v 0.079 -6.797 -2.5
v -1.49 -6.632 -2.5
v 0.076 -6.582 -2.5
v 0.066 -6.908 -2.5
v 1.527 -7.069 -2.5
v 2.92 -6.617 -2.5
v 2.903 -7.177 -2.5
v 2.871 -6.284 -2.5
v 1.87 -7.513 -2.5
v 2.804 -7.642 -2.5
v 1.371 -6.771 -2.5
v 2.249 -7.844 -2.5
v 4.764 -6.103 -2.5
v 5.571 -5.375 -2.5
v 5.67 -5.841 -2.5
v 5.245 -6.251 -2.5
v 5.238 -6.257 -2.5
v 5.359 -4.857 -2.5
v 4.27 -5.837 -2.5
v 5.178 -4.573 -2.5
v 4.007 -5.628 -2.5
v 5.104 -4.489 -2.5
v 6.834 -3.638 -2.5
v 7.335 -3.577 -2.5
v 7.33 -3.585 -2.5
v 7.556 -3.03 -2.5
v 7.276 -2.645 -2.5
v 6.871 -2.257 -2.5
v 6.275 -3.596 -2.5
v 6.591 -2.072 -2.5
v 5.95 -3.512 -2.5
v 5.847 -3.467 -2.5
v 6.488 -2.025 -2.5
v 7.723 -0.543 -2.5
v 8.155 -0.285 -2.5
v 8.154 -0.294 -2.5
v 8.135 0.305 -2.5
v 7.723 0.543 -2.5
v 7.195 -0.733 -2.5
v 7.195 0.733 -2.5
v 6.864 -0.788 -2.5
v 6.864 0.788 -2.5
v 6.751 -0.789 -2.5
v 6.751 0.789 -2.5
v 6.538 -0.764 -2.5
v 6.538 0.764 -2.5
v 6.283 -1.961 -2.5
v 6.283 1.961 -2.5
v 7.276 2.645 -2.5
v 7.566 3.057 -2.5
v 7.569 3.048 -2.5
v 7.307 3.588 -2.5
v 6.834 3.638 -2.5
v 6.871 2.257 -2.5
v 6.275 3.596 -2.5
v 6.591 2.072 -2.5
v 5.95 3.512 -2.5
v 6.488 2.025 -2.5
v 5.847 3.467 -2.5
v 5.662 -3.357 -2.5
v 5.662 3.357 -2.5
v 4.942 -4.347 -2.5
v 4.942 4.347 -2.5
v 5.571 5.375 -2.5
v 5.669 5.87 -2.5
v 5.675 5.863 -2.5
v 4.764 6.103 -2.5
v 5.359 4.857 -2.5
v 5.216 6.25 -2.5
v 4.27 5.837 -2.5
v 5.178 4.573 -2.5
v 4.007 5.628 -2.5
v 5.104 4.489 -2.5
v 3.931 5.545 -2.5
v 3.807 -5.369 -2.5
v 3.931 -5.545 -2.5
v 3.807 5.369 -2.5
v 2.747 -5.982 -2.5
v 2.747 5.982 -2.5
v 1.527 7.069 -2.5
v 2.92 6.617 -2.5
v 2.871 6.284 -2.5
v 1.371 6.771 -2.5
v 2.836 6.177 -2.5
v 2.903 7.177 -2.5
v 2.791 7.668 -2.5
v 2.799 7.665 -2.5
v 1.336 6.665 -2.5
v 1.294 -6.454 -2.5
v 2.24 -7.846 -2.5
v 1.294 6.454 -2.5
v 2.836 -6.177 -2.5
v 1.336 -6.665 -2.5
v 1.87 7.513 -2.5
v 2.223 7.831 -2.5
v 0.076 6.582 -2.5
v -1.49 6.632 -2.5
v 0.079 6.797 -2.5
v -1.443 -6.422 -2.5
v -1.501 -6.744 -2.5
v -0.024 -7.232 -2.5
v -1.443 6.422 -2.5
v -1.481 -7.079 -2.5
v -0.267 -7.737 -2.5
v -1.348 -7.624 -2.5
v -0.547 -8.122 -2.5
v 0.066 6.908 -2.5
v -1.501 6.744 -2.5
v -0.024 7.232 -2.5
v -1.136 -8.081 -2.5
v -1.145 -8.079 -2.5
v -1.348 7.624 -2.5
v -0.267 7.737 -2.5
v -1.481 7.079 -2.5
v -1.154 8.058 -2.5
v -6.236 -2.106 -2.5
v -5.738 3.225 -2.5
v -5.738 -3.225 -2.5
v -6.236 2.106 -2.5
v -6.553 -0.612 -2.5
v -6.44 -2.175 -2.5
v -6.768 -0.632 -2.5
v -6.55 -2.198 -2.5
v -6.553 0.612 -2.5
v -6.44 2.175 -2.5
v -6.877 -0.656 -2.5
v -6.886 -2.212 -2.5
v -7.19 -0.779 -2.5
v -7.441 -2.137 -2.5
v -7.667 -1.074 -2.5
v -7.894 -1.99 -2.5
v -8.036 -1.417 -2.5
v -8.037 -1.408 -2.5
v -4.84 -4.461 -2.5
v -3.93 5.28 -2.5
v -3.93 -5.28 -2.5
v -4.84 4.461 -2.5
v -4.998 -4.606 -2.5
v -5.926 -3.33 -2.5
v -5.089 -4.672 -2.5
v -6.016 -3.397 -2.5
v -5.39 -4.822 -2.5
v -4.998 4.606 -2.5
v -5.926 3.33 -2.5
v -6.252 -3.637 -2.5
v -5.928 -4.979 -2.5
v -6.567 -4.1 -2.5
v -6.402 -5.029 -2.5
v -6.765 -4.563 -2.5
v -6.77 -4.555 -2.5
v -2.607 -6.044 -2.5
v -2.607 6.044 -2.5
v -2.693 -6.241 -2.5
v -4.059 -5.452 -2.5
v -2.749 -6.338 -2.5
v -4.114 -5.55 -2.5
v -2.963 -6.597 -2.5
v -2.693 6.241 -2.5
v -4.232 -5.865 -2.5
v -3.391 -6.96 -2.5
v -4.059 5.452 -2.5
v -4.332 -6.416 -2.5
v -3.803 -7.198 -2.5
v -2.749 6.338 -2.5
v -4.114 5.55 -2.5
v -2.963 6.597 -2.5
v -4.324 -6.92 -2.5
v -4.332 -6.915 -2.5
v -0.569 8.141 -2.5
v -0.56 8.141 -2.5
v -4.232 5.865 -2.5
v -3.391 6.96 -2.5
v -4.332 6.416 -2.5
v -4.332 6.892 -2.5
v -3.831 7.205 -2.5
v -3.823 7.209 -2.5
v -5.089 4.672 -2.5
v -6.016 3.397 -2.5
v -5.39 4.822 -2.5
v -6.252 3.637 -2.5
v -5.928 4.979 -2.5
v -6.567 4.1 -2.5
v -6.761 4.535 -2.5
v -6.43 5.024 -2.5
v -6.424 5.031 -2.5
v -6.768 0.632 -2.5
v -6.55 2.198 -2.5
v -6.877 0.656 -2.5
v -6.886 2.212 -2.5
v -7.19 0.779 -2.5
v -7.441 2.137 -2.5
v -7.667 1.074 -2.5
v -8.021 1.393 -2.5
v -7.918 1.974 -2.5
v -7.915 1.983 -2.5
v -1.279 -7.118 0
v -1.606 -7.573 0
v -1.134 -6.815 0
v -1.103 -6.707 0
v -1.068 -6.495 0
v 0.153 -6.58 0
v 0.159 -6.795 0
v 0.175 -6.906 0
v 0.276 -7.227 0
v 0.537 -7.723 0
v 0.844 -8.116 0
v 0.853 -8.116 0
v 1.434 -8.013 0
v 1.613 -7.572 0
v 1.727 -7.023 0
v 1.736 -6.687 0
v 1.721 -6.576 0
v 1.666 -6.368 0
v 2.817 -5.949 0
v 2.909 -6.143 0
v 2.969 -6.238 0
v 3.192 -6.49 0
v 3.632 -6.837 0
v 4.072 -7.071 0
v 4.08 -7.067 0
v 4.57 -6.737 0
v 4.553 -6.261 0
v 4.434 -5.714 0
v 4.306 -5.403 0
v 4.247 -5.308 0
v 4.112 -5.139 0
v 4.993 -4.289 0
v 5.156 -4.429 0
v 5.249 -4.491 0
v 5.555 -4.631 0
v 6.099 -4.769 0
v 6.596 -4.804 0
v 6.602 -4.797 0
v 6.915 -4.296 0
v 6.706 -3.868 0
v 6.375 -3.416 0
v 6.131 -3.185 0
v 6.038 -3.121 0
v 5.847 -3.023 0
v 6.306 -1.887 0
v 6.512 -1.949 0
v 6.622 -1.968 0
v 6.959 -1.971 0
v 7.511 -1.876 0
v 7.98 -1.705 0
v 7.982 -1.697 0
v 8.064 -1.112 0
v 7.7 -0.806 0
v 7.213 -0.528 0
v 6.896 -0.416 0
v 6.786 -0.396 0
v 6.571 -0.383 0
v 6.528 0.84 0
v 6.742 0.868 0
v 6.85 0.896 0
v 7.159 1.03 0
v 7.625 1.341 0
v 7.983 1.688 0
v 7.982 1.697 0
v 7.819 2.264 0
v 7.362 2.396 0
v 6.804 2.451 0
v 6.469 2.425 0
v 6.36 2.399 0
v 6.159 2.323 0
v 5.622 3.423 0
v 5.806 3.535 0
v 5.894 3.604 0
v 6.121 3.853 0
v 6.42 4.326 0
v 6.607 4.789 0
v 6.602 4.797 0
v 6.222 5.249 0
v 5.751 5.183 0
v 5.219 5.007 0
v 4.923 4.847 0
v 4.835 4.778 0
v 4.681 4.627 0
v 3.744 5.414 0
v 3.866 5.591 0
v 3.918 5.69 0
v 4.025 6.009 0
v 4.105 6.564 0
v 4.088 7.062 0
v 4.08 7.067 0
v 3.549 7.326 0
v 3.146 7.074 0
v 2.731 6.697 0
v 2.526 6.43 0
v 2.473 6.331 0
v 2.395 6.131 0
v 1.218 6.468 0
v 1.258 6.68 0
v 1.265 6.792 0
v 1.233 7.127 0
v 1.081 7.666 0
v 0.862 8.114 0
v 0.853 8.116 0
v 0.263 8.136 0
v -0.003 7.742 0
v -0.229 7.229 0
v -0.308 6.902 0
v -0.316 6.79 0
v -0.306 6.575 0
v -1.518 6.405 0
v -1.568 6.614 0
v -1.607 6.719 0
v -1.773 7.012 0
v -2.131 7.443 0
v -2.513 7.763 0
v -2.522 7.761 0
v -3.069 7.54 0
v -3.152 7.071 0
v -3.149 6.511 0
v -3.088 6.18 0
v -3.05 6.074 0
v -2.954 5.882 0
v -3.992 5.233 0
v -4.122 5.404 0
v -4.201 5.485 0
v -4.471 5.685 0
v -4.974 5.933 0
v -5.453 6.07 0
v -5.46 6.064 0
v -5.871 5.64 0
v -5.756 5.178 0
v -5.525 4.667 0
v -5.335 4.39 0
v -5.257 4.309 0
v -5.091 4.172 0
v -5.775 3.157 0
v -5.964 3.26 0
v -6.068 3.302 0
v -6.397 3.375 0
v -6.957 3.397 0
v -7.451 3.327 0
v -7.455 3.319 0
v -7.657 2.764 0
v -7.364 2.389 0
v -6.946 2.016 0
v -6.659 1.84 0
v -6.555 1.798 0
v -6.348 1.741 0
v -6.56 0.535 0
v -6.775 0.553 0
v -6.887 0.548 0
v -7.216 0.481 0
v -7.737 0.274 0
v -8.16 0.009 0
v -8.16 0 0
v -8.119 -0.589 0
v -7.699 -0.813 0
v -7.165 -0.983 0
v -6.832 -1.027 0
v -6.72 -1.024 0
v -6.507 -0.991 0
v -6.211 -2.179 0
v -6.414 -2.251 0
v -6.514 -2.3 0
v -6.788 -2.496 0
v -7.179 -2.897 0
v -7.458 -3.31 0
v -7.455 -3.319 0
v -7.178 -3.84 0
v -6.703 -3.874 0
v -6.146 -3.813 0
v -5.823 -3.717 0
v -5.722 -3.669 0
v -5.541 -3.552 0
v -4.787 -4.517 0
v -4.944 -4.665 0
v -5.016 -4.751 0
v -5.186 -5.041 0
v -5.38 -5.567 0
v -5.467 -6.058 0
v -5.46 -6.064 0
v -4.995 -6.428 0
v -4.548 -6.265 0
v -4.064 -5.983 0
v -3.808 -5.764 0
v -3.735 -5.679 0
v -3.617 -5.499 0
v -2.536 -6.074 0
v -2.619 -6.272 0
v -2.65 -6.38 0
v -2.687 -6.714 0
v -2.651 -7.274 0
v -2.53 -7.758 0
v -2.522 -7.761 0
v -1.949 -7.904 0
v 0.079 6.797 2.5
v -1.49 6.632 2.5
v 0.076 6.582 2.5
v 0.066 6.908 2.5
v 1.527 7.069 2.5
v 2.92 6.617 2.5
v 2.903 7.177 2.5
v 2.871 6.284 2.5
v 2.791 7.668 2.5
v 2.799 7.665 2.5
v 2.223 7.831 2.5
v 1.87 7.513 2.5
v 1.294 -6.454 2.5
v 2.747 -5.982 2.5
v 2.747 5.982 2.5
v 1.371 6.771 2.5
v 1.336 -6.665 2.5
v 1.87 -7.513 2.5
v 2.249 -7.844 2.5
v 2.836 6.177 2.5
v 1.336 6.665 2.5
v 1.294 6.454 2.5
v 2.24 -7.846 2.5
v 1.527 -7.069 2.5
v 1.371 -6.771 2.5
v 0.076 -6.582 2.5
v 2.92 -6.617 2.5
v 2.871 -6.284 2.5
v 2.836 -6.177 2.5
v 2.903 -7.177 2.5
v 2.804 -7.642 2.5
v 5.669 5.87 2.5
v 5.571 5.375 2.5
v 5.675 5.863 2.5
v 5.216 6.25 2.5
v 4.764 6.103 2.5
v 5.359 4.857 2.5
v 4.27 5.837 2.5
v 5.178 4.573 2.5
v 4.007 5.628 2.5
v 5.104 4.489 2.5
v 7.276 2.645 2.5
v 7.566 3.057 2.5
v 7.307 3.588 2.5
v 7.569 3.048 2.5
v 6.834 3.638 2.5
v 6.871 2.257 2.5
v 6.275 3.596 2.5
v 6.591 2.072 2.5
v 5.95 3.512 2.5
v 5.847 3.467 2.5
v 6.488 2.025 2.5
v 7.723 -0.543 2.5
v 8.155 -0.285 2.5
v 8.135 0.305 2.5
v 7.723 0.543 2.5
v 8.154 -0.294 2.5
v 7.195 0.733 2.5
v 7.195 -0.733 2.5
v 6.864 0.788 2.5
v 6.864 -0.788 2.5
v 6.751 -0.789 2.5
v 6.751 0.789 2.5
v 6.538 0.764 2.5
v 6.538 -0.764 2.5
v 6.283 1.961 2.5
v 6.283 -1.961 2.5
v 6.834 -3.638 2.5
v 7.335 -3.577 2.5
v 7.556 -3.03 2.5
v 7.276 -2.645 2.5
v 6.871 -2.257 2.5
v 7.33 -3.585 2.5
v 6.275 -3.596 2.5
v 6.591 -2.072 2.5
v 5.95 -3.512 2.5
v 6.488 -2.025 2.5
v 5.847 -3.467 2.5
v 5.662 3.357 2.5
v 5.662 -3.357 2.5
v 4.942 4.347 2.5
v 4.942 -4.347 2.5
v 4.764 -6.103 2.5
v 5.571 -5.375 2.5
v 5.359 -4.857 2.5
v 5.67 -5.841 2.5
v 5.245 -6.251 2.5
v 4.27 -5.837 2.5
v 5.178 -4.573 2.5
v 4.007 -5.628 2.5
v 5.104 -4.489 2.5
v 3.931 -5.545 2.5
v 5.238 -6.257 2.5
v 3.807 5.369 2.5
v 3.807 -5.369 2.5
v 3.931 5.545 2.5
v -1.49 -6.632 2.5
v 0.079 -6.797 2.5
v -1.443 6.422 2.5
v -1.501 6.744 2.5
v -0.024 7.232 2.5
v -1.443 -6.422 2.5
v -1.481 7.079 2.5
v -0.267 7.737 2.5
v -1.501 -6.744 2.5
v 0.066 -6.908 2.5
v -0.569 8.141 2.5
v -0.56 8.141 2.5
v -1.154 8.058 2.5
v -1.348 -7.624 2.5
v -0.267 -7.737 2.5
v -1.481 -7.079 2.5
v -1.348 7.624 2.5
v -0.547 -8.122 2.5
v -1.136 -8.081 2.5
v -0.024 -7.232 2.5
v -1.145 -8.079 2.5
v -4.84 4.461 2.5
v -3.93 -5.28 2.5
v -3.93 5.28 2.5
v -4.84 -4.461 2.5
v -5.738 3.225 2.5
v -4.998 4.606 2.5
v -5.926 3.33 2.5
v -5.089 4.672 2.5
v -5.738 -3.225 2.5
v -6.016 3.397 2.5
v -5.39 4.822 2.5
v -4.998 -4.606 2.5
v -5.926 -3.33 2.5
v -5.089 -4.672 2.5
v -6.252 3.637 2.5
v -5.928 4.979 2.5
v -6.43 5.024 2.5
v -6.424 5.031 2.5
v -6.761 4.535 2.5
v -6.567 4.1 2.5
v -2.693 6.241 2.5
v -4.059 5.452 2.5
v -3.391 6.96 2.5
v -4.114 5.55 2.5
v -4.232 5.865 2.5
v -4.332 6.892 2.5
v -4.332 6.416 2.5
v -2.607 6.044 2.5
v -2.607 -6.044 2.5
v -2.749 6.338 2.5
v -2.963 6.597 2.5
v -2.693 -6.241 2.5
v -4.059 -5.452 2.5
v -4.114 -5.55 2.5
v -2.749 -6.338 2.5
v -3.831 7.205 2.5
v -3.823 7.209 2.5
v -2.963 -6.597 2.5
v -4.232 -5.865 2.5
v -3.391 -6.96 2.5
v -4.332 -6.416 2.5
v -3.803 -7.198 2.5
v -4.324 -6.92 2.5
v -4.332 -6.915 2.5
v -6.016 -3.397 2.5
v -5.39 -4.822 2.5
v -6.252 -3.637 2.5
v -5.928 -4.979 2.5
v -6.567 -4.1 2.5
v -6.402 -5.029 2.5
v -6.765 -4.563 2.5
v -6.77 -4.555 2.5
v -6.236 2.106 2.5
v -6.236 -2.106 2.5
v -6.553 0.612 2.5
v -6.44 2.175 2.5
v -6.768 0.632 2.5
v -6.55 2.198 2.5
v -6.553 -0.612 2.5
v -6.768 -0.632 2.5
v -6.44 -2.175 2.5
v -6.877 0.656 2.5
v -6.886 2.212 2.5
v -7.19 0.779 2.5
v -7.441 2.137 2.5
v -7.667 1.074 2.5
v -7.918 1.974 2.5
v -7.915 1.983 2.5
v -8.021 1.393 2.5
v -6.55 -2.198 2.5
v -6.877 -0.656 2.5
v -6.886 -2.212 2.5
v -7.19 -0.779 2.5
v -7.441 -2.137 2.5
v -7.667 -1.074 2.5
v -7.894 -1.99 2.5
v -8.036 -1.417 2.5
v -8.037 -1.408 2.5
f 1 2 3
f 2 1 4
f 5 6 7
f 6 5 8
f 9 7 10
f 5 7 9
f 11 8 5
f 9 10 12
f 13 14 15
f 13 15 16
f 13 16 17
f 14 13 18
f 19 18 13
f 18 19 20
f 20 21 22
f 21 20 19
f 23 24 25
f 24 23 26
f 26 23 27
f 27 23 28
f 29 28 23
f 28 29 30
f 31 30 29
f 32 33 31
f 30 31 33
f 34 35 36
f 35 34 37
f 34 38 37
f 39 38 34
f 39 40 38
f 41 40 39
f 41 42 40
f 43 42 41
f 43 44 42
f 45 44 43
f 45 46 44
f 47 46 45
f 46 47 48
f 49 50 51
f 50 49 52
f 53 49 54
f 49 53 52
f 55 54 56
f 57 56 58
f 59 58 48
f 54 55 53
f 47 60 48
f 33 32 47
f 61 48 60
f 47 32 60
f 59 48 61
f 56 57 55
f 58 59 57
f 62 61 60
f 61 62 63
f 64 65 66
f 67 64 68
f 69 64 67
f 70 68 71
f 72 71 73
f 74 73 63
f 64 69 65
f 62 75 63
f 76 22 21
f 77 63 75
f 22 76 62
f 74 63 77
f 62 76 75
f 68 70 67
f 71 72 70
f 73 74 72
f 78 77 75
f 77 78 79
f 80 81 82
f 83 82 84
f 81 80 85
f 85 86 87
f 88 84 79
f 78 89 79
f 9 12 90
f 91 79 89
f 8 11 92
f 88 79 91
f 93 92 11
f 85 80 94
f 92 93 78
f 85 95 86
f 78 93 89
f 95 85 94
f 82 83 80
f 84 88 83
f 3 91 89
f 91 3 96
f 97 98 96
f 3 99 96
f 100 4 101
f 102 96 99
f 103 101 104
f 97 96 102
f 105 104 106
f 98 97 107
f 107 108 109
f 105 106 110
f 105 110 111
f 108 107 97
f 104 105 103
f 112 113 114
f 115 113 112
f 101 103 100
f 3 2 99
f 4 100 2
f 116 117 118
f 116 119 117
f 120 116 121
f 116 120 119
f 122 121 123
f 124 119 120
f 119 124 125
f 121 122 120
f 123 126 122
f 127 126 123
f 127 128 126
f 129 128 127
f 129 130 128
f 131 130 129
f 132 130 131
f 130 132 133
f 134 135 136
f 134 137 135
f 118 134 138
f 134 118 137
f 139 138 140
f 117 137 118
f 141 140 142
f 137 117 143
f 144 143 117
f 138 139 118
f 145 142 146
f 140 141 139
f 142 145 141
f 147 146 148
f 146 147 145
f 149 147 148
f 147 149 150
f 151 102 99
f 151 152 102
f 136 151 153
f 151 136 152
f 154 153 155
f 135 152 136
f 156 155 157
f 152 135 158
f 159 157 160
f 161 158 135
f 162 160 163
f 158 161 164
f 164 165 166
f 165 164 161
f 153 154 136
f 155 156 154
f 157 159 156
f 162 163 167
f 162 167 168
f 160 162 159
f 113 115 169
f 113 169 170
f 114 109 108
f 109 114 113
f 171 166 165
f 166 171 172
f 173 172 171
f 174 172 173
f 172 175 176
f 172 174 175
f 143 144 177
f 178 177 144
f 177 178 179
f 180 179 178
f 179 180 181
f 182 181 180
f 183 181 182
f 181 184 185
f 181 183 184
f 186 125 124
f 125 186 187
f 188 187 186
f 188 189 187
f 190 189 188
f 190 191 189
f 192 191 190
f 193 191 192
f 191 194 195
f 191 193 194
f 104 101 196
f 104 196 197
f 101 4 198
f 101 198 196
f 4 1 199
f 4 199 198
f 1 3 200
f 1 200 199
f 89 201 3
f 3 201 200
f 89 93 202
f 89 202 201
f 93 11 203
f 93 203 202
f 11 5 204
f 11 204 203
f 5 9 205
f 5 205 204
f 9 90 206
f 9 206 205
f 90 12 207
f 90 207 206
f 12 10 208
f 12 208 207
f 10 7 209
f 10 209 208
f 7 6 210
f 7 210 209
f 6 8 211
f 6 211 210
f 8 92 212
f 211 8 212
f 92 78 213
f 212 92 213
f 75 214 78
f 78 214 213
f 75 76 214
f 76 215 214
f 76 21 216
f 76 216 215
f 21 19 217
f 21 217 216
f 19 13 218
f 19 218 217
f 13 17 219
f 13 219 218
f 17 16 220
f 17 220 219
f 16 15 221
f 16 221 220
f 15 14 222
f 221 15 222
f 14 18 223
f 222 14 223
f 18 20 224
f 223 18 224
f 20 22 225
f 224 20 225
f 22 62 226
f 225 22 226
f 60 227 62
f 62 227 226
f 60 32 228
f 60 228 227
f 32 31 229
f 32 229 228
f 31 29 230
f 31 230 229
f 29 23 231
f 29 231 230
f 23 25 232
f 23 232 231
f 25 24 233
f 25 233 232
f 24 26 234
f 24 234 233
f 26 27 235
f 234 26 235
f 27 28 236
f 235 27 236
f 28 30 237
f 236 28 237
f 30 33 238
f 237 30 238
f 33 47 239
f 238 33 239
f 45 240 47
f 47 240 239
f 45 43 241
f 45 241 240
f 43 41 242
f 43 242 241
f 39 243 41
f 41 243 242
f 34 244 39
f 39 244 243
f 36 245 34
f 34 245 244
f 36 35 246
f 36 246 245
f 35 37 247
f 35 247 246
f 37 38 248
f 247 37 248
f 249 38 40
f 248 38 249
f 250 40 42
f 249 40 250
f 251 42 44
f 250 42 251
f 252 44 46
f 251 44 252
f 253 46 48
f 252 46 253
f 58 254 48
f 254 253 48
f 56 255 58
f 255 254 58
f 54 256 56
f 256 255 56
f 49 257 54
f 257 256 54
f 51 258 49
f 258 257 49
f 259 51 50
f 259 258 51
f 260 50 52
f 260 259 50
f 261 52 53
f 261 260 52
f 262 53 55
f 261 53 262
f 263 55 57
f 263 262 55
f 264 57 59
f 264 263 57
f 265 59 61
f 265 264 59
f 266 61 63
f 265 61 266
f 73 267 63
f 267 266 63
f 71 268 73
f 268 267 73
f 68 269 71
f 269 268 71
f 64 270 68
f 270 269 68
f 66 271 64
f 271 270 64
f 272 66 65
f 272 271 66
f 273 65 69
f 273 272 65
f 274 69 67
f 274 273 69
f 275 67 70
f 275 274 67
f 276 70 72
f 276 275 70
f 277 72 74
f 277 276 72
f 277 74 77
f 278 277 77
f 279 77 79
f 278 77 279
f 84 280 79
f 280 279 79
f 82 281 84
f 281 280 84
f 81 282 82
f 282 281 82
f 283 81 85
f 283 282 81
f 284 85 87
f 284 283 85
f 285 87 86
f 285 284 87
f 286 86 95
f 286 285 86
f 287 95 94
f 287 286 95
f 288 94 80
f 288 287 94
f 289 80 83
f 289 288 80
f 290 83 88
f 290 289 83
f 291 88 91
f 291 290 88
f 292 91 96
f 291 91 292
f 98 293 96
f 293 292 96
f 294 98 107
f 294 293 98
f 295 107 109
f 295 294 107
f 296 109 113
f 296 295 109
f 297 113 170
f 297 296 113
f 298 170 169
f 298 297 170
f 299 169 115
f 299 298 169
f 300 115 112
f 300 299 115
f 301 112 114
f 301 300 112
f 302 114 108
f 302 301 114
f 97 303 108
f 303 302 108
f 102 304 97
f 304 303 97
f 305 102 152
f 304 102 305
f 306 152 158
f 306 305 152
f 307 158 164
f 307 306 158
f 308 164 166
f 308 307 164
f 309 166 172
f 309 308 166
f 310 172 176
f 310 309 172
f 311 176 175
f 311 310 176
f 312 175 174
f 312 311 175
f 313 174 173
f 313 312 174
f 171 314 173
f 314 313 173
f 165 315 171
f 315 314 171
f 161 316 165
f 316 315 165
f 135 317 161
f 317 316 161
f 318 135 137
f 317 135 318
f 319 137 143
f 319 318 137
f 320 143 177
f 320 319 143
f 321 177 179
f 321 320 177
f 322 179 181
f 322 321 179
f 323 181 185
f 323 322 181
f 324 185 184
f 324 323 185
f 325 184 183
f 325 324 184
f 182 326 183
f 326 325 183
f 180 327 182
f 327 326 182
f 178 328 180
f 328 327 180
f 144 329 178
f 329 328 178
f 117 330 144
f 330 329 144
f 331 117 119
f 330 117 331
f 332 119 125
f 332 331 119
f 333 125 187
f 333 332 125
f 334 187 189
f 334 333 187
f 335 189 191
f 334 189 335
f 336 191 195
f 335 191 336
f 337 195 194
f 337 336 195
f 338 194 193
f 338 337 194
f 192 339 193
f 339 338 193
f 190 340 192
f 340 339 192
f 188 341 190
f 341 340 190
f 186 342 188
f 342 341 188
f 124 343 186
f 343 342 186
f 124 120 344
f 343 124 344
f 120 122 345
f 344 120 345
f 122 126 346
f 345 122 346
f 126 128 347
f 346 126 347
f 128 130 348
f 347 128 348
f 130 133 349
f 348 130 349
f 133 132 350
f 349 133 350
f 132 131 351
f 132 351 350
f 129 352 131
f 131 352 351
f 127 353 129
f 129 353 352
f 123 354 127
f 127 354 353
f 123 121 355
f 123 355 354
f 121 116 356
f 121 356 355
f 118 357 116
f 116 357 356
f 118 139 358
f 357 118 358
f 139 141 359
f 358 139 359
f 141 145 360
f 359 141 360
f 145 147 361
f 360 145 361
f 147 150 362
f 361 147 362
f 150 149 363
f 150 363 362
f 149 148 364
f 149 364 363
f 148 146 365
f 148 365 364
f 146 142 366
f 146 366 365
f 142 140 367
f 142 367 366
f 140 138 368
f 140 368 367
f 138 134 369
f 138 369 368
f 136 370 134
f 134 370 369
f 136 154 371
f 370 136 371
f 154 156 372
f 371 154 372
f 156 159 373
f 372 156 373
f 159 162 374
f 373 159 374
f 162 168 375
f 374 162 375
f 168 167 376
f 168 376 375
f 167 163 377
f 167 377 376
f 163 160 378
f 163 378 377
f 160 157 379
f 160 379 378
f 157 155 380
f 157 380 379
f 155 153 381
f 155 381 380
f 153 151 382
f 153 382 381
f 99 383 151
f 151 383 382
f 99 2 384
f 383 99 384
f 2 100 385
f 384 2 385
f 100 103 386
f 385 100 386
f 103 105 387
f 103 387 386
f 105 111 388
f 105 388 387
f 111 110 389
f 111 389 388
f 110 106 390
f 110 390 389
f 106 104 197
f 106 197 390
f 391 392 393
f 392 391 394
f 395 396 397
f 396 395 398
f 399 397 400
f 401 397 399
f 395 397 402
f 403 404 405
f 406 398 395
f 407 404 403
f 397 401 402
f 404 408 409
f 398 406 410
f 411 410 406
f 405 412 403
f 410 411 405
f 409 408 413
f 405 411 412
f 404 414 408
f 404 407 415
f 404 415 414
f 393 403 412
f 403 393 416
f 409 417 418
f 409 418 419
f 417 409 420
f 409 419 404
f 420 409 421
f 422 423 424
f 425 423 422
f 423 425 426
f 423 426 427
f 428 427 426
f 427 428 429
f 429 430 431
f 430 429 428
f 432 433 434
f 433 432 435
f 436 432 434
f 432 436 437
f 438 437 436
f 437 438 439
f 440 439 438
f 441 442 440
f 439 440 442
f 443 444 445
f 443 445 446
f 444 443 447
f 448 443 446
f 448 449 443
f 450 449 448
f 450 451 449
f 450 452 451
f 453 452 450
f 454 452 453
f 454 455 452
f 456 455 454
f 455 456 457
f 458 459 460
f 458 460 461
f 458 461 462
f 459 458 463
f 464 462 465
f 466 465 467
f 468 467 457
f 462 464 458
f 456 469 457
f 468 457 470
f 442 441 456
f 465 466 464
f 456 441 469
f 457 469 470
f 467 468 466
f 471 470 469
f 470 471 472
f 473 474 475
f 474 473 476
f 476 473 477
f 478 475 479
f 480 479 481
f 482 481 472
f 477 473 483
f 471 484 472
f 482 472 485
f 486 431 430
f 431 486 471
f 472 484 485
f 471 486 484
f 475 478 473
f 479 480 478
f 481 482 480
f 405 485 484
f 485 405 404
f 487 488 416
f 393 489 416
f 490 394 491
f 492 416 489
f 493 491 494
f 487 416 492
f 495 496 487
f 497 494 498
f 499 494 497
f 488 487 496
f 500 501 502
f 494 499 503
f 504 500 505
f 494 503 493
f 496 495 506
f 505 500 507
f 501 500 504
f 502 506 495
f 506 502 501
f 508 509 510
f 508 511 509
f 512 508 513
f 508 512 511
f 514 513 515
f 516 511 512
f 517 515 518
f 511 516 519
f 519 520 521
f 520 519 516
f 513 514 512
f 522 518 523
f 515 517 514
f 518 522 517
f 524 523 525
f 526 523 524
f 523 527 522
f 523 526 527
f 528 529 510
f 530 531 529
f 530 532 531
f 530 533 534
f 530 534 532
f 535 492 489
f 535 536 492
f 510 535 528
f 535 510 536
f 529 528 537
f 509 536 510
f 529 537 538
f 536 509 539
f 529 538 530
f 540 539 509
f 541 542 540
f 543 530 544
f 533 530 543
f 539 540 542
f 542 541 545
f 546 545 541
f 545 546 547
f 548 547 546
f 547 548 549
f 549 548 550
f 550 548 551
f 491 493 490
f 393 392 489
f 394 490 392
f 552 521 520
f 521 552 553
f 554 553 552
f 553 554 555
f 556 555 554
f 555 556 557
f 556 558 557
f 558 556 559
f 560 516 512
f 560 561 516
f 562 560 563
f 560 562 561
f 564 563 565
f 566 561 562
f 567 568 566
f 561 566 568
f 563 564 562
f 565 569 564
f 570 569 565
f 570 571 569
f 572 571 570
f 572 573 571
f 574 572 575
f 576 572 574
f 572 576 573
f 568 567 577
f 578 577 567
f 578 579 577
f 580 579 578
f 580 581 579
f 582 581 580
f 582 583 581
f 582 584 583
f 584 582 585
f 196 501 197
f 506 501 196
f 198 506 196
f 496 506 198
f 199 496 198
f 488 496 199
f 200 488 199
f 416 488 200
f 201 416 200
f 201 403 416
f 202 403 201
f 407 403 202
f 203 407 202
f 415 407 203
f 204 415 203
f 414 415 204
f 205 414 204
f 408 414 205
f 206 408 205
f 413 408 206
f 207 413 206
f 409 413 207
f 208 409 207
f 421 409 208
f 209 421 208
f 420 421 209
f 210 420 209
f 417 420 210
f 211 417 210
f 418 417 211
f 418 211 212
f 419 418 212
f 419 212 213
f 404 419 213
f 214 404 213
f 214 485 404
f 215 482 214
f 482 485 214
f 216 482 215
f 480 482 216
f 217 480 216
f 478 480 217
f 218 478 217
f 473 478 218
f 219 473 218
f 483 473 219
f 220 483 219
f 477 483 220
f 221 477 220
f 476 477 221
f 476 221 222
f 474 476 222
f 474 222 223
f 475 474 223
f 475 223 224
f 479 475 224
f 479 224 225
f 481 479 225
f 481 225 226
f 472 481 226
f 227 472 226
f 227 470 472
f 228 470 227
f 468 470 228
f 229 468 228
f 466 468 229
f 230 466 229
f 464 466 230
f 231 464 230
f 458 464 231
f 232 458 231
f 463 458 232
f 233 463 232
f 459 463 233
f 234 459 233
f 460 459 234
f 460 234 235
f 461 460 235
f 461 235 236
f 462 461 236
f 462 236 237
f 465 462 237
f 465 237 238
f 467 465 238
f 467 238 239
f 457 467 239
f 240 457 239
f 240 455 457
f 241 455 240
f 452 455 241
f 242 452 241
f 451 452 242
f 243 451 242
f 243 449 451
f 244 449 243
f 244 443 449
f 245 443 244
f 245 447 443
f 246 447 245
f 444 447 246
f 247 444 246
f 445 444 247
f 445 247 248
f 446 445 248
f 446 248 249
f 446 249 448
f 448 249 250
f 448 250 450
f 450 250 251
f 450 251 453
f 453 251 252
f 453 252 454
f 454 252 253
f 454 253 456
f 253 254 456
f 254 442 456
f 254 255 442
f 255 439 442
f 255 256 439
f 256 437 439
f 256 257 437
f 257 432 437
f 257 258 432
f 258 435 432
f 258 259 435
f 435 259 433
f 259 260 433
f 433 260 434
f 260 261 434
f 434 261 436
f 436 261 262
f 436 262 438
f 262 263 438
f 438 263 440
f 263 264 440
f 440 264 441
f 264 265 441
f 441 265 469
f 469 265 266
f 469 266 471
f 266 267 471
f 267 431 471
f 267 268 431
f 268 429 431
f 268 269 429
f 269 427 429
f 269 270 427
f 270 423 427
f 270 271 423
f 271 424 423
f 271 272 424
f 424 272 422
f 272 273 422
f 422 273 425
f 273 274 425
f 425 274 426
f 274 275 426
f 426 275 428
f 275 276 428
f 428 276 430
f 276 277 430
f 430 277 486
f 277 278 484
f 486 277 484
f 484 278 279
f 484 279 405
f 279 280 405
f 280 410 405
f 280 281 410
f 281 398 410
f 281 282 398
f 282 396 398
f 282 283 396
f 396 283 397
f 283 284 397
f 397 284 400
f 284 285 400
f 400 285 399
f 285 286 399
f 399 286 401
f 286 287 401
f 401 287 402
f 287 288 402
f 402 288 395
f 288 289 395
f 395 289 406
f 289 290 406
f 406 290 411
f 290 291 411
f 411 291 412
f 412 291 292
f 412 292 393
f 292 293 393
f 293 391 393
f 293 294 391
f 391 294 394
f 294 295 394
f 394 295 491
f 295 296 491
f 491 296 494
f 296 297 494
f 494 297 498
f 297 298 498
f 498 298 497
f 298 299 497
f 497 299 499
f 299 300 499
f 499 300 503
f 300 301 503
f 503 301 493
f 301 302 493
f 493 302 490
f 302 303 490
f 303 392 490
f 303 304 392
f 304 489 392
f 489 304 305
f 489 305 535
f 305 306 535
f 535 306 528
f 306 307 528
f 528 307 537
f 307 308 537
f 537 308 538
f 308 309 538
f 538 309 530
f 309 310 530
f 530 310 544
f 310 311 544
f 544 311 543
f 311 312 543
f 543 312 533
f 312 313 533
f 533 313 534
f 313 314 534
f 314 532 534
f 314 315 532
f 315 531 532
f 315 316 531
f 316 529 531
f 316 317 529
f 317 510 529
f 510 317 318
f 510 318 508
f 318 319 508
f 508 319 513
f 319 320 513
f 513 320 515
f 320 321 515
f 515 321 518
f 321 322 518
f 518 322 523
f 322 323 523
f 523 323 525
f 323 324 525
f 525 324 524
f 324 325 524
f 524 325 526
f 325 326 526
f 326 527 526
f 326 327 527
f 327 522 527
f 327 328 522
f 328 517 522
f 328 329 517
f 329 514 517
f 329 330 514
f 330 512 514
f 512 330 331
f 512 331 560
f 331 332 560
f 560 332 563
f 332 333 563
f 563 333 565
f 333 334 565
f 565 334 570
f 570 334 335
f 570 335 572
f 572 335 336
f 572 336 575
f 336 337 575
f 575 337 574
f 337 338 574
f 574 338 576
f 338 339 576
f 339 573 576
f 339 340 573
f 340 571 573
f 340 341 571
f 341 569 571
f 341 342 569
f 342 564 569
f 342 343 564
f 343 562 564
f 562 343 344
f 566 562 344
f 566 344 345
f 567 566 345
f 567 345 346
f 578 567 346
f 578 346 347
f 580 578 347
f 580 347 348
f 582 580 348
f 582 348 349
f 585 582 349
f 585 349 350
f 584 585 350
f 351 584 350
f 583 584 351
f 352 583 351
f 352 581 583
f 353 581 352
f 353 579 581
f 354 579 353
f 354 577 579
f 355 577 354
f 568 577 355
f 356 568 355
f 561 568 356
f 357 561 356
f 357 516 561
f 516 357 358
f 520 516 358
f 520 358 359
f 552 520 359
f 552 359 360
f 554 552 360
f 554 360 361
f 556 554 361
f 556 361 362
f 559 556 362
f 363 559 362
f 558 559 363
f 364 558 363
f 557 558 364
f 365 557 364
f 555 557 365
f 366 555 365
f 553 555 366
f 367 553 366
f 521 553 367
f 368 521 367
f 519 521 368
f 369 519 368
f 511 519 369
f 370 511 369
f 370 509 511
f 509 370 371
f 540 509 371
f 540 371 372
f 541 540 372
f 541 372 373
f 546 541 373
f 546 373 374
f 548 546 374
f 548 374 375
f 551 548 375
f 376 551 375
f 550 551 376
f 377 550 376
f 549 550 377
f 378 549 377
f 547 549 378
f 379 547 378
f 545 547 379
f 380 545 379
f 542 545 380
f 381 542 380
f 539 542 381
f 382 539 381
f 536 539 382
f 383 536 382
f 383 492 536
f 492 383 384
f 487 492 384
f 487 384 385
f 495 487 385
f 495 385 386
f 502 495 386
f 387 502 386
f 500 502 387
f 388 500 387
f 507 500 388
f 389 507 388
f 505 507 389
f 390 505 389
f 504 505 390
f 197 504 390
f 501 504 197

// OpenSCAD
gear(
	number_of_teeth=15,
 	modulus=1,
	pressure_angle=25,
	depth_ratio=.5,
	clearance=.25,
	h=5,
	center=true,
    twist=10,
    twist2=true);

function gear_outer_radius(number_of_teeth,
	modulus,
	depth_ratio,
	clearance) = (number_of_teeth*modulus/2)+depth_ratio*(modulus*PI)/2-clearance/2;


function gear_hub_size(number_of_teeth, modulus,depth_ratio,clearance) = gear_pitch_radius(number_of_teeth,modulus)-depth_ratio*(modulus*PI)/2-clearance/2;

function gear_pitch_radius(number_of_teeth, modulus) = number_of_teeth*modulus/2;

module gear (
	number_of_teeth,
	modulus,
	pressure_angle,
	depth_ratio,
	clearance,
	h,
	center=false,
    twist,twist2)
{
    if(twist2==undef) {
        linear_extrude(height=h, center=center, convexity=4,twist=twist)
        {
            gear2D(number_of_teeth, modulus, pressure_angle, depth_ratio, clearance);
        }
    } else {
        translate([0,0,-h/4])
        linear_extrude(height=h/2, center=center, convexity=4,twist=twist)
        {
            gear2D(number_of_teeth, modulus, pressure_angle, depth_ratio, clearance);
        }        

        translate([0,0,h/4])
        rotate([0,0,-twist])
        linear_extrude(height=h/2, center=center, convexity=4,twist=-twist)
        {
            gear2D(number_of_teeth, modulus, pressure_angle, depth_ratio, clearance);
        }        
    }
}

module gear2D (
	number_of_teeth,
	modulus,
	pressure_angle,
	depth_ratio,
	clearance)
{
	circular_pitch = modulus*PI;
	pitch_radius = gear_pitch_radius(number_of_teeth, modulus);
	base_radius = pitch_radius*cos(pressure_angle);
	depth=circular_pitch/(2*tan(pressure_angle));
	outer_radius = clearance<0 ? pitch_radius+depth/2-clearance : pitch_radius+depth/2;
	root_radius1 = pitch_radius-depth/2-clearance/2;
	root_radius = (clearance<0 && root_radius1<base_radius) ? base_radius : root_radius1;
	backlash_angle = clearance/(pitch_radius*cos(pressure_angle)) * 180 / PI;
	half_thick_angle = 90/number_of_teeth - backlash_angle/2;
	pitch_point = involute (base_radius, involute_intersect_angle (base_radius, pitch_radius));
	pitch_angle = atan2 (pitch_point[1], pitch_point[0]);
	min_radius = max (base_radius,root_radius);

	*echo("circular_pitch = ", circular_pitch,
		"pitch_radius = ", pitch_radius,
		"base_radius = ", base_radius,
		"depth = ", depth,
		"outer_radius = ", outer_radius);

	intersection()
	{
		rotate(90/number_of_teeth)
			circle($fn=number_of_teeth*3,r=pitch_radius+depth_ratio*circular_pitch/2-clearance/2);
		union()
		{
			rotate(90/number_of_teeth)
				circle($fn=number_of_teeth*2,r=max(root_radius,pitch_radius-depth_ratio*circular_pitch/2-clearance/2));
			for (i = [1:number_of_teeth])rotate(i*360/number_of_teeth)
			{
				halftooth (
					pitch_angle,
					base_radius,
					min_radius,
					outer_radius,
					half_thick_angle);		
				mirror([0,1]) halftooth (
					pitch_angle,
					base_radius,
					min_radius,
					outer_radius,
					half_thick_angle);
			}
		}
	}
}

module halftooth (
	pitch_angle,
	base_radius,
	min_radius,
	outer_radius,
	half_thick_angle)
{
	index=[0,1,2,3,4,5];
	start_angle = max(involute_intersect_angle (base_radius, min_radius)-5,0);
	stop_angle = involute_intersect_angle (base_radius, outer_radius);
	angle=index*(stop_angle-start_angle)/index[len(index)-1];
	p=[[0,0],
	involute(base_radius,angle[0]+start_angle),
	involute(base_radius,angle[1]+start_angle),
	involute(base_radius,angle[2]+start_angle),
	involute(base_radius,angle[3]+start_angle),
	involute(base_radius,angle[4]+start_angle),
	involute(base_radius,angle[5]+start_angle)];

	difference()	
	{
		rotate(-pitch_angle-half_thick_angle)polygon(points=p);
		square(2*outer_radius);
	}
}

// Mathematical Functions
//===============

// Finds the angle of the involute about the base radius at the given distance (radius) from it's center.
//source: http://www.mathhelpforum.com/math-help/geometry/136011-circle-involute-solving-y-any-given-x.html

function involute_intersect_angle (base_radius, radius) = sqrt (pow (radius/base_radius, 2) - 1) * 180 / PI;

// Calculate the involute position for a given base radius and involute angle.

function involute (base_radius, involute_angle) =
[
	base_radius*(cos (involute_angle) + involute_angle*PI/180*sin (involute_angle)),
	base_radius*(sin (involute_angle) - involute_angle*PI/180*cos (involute_angle))
];
